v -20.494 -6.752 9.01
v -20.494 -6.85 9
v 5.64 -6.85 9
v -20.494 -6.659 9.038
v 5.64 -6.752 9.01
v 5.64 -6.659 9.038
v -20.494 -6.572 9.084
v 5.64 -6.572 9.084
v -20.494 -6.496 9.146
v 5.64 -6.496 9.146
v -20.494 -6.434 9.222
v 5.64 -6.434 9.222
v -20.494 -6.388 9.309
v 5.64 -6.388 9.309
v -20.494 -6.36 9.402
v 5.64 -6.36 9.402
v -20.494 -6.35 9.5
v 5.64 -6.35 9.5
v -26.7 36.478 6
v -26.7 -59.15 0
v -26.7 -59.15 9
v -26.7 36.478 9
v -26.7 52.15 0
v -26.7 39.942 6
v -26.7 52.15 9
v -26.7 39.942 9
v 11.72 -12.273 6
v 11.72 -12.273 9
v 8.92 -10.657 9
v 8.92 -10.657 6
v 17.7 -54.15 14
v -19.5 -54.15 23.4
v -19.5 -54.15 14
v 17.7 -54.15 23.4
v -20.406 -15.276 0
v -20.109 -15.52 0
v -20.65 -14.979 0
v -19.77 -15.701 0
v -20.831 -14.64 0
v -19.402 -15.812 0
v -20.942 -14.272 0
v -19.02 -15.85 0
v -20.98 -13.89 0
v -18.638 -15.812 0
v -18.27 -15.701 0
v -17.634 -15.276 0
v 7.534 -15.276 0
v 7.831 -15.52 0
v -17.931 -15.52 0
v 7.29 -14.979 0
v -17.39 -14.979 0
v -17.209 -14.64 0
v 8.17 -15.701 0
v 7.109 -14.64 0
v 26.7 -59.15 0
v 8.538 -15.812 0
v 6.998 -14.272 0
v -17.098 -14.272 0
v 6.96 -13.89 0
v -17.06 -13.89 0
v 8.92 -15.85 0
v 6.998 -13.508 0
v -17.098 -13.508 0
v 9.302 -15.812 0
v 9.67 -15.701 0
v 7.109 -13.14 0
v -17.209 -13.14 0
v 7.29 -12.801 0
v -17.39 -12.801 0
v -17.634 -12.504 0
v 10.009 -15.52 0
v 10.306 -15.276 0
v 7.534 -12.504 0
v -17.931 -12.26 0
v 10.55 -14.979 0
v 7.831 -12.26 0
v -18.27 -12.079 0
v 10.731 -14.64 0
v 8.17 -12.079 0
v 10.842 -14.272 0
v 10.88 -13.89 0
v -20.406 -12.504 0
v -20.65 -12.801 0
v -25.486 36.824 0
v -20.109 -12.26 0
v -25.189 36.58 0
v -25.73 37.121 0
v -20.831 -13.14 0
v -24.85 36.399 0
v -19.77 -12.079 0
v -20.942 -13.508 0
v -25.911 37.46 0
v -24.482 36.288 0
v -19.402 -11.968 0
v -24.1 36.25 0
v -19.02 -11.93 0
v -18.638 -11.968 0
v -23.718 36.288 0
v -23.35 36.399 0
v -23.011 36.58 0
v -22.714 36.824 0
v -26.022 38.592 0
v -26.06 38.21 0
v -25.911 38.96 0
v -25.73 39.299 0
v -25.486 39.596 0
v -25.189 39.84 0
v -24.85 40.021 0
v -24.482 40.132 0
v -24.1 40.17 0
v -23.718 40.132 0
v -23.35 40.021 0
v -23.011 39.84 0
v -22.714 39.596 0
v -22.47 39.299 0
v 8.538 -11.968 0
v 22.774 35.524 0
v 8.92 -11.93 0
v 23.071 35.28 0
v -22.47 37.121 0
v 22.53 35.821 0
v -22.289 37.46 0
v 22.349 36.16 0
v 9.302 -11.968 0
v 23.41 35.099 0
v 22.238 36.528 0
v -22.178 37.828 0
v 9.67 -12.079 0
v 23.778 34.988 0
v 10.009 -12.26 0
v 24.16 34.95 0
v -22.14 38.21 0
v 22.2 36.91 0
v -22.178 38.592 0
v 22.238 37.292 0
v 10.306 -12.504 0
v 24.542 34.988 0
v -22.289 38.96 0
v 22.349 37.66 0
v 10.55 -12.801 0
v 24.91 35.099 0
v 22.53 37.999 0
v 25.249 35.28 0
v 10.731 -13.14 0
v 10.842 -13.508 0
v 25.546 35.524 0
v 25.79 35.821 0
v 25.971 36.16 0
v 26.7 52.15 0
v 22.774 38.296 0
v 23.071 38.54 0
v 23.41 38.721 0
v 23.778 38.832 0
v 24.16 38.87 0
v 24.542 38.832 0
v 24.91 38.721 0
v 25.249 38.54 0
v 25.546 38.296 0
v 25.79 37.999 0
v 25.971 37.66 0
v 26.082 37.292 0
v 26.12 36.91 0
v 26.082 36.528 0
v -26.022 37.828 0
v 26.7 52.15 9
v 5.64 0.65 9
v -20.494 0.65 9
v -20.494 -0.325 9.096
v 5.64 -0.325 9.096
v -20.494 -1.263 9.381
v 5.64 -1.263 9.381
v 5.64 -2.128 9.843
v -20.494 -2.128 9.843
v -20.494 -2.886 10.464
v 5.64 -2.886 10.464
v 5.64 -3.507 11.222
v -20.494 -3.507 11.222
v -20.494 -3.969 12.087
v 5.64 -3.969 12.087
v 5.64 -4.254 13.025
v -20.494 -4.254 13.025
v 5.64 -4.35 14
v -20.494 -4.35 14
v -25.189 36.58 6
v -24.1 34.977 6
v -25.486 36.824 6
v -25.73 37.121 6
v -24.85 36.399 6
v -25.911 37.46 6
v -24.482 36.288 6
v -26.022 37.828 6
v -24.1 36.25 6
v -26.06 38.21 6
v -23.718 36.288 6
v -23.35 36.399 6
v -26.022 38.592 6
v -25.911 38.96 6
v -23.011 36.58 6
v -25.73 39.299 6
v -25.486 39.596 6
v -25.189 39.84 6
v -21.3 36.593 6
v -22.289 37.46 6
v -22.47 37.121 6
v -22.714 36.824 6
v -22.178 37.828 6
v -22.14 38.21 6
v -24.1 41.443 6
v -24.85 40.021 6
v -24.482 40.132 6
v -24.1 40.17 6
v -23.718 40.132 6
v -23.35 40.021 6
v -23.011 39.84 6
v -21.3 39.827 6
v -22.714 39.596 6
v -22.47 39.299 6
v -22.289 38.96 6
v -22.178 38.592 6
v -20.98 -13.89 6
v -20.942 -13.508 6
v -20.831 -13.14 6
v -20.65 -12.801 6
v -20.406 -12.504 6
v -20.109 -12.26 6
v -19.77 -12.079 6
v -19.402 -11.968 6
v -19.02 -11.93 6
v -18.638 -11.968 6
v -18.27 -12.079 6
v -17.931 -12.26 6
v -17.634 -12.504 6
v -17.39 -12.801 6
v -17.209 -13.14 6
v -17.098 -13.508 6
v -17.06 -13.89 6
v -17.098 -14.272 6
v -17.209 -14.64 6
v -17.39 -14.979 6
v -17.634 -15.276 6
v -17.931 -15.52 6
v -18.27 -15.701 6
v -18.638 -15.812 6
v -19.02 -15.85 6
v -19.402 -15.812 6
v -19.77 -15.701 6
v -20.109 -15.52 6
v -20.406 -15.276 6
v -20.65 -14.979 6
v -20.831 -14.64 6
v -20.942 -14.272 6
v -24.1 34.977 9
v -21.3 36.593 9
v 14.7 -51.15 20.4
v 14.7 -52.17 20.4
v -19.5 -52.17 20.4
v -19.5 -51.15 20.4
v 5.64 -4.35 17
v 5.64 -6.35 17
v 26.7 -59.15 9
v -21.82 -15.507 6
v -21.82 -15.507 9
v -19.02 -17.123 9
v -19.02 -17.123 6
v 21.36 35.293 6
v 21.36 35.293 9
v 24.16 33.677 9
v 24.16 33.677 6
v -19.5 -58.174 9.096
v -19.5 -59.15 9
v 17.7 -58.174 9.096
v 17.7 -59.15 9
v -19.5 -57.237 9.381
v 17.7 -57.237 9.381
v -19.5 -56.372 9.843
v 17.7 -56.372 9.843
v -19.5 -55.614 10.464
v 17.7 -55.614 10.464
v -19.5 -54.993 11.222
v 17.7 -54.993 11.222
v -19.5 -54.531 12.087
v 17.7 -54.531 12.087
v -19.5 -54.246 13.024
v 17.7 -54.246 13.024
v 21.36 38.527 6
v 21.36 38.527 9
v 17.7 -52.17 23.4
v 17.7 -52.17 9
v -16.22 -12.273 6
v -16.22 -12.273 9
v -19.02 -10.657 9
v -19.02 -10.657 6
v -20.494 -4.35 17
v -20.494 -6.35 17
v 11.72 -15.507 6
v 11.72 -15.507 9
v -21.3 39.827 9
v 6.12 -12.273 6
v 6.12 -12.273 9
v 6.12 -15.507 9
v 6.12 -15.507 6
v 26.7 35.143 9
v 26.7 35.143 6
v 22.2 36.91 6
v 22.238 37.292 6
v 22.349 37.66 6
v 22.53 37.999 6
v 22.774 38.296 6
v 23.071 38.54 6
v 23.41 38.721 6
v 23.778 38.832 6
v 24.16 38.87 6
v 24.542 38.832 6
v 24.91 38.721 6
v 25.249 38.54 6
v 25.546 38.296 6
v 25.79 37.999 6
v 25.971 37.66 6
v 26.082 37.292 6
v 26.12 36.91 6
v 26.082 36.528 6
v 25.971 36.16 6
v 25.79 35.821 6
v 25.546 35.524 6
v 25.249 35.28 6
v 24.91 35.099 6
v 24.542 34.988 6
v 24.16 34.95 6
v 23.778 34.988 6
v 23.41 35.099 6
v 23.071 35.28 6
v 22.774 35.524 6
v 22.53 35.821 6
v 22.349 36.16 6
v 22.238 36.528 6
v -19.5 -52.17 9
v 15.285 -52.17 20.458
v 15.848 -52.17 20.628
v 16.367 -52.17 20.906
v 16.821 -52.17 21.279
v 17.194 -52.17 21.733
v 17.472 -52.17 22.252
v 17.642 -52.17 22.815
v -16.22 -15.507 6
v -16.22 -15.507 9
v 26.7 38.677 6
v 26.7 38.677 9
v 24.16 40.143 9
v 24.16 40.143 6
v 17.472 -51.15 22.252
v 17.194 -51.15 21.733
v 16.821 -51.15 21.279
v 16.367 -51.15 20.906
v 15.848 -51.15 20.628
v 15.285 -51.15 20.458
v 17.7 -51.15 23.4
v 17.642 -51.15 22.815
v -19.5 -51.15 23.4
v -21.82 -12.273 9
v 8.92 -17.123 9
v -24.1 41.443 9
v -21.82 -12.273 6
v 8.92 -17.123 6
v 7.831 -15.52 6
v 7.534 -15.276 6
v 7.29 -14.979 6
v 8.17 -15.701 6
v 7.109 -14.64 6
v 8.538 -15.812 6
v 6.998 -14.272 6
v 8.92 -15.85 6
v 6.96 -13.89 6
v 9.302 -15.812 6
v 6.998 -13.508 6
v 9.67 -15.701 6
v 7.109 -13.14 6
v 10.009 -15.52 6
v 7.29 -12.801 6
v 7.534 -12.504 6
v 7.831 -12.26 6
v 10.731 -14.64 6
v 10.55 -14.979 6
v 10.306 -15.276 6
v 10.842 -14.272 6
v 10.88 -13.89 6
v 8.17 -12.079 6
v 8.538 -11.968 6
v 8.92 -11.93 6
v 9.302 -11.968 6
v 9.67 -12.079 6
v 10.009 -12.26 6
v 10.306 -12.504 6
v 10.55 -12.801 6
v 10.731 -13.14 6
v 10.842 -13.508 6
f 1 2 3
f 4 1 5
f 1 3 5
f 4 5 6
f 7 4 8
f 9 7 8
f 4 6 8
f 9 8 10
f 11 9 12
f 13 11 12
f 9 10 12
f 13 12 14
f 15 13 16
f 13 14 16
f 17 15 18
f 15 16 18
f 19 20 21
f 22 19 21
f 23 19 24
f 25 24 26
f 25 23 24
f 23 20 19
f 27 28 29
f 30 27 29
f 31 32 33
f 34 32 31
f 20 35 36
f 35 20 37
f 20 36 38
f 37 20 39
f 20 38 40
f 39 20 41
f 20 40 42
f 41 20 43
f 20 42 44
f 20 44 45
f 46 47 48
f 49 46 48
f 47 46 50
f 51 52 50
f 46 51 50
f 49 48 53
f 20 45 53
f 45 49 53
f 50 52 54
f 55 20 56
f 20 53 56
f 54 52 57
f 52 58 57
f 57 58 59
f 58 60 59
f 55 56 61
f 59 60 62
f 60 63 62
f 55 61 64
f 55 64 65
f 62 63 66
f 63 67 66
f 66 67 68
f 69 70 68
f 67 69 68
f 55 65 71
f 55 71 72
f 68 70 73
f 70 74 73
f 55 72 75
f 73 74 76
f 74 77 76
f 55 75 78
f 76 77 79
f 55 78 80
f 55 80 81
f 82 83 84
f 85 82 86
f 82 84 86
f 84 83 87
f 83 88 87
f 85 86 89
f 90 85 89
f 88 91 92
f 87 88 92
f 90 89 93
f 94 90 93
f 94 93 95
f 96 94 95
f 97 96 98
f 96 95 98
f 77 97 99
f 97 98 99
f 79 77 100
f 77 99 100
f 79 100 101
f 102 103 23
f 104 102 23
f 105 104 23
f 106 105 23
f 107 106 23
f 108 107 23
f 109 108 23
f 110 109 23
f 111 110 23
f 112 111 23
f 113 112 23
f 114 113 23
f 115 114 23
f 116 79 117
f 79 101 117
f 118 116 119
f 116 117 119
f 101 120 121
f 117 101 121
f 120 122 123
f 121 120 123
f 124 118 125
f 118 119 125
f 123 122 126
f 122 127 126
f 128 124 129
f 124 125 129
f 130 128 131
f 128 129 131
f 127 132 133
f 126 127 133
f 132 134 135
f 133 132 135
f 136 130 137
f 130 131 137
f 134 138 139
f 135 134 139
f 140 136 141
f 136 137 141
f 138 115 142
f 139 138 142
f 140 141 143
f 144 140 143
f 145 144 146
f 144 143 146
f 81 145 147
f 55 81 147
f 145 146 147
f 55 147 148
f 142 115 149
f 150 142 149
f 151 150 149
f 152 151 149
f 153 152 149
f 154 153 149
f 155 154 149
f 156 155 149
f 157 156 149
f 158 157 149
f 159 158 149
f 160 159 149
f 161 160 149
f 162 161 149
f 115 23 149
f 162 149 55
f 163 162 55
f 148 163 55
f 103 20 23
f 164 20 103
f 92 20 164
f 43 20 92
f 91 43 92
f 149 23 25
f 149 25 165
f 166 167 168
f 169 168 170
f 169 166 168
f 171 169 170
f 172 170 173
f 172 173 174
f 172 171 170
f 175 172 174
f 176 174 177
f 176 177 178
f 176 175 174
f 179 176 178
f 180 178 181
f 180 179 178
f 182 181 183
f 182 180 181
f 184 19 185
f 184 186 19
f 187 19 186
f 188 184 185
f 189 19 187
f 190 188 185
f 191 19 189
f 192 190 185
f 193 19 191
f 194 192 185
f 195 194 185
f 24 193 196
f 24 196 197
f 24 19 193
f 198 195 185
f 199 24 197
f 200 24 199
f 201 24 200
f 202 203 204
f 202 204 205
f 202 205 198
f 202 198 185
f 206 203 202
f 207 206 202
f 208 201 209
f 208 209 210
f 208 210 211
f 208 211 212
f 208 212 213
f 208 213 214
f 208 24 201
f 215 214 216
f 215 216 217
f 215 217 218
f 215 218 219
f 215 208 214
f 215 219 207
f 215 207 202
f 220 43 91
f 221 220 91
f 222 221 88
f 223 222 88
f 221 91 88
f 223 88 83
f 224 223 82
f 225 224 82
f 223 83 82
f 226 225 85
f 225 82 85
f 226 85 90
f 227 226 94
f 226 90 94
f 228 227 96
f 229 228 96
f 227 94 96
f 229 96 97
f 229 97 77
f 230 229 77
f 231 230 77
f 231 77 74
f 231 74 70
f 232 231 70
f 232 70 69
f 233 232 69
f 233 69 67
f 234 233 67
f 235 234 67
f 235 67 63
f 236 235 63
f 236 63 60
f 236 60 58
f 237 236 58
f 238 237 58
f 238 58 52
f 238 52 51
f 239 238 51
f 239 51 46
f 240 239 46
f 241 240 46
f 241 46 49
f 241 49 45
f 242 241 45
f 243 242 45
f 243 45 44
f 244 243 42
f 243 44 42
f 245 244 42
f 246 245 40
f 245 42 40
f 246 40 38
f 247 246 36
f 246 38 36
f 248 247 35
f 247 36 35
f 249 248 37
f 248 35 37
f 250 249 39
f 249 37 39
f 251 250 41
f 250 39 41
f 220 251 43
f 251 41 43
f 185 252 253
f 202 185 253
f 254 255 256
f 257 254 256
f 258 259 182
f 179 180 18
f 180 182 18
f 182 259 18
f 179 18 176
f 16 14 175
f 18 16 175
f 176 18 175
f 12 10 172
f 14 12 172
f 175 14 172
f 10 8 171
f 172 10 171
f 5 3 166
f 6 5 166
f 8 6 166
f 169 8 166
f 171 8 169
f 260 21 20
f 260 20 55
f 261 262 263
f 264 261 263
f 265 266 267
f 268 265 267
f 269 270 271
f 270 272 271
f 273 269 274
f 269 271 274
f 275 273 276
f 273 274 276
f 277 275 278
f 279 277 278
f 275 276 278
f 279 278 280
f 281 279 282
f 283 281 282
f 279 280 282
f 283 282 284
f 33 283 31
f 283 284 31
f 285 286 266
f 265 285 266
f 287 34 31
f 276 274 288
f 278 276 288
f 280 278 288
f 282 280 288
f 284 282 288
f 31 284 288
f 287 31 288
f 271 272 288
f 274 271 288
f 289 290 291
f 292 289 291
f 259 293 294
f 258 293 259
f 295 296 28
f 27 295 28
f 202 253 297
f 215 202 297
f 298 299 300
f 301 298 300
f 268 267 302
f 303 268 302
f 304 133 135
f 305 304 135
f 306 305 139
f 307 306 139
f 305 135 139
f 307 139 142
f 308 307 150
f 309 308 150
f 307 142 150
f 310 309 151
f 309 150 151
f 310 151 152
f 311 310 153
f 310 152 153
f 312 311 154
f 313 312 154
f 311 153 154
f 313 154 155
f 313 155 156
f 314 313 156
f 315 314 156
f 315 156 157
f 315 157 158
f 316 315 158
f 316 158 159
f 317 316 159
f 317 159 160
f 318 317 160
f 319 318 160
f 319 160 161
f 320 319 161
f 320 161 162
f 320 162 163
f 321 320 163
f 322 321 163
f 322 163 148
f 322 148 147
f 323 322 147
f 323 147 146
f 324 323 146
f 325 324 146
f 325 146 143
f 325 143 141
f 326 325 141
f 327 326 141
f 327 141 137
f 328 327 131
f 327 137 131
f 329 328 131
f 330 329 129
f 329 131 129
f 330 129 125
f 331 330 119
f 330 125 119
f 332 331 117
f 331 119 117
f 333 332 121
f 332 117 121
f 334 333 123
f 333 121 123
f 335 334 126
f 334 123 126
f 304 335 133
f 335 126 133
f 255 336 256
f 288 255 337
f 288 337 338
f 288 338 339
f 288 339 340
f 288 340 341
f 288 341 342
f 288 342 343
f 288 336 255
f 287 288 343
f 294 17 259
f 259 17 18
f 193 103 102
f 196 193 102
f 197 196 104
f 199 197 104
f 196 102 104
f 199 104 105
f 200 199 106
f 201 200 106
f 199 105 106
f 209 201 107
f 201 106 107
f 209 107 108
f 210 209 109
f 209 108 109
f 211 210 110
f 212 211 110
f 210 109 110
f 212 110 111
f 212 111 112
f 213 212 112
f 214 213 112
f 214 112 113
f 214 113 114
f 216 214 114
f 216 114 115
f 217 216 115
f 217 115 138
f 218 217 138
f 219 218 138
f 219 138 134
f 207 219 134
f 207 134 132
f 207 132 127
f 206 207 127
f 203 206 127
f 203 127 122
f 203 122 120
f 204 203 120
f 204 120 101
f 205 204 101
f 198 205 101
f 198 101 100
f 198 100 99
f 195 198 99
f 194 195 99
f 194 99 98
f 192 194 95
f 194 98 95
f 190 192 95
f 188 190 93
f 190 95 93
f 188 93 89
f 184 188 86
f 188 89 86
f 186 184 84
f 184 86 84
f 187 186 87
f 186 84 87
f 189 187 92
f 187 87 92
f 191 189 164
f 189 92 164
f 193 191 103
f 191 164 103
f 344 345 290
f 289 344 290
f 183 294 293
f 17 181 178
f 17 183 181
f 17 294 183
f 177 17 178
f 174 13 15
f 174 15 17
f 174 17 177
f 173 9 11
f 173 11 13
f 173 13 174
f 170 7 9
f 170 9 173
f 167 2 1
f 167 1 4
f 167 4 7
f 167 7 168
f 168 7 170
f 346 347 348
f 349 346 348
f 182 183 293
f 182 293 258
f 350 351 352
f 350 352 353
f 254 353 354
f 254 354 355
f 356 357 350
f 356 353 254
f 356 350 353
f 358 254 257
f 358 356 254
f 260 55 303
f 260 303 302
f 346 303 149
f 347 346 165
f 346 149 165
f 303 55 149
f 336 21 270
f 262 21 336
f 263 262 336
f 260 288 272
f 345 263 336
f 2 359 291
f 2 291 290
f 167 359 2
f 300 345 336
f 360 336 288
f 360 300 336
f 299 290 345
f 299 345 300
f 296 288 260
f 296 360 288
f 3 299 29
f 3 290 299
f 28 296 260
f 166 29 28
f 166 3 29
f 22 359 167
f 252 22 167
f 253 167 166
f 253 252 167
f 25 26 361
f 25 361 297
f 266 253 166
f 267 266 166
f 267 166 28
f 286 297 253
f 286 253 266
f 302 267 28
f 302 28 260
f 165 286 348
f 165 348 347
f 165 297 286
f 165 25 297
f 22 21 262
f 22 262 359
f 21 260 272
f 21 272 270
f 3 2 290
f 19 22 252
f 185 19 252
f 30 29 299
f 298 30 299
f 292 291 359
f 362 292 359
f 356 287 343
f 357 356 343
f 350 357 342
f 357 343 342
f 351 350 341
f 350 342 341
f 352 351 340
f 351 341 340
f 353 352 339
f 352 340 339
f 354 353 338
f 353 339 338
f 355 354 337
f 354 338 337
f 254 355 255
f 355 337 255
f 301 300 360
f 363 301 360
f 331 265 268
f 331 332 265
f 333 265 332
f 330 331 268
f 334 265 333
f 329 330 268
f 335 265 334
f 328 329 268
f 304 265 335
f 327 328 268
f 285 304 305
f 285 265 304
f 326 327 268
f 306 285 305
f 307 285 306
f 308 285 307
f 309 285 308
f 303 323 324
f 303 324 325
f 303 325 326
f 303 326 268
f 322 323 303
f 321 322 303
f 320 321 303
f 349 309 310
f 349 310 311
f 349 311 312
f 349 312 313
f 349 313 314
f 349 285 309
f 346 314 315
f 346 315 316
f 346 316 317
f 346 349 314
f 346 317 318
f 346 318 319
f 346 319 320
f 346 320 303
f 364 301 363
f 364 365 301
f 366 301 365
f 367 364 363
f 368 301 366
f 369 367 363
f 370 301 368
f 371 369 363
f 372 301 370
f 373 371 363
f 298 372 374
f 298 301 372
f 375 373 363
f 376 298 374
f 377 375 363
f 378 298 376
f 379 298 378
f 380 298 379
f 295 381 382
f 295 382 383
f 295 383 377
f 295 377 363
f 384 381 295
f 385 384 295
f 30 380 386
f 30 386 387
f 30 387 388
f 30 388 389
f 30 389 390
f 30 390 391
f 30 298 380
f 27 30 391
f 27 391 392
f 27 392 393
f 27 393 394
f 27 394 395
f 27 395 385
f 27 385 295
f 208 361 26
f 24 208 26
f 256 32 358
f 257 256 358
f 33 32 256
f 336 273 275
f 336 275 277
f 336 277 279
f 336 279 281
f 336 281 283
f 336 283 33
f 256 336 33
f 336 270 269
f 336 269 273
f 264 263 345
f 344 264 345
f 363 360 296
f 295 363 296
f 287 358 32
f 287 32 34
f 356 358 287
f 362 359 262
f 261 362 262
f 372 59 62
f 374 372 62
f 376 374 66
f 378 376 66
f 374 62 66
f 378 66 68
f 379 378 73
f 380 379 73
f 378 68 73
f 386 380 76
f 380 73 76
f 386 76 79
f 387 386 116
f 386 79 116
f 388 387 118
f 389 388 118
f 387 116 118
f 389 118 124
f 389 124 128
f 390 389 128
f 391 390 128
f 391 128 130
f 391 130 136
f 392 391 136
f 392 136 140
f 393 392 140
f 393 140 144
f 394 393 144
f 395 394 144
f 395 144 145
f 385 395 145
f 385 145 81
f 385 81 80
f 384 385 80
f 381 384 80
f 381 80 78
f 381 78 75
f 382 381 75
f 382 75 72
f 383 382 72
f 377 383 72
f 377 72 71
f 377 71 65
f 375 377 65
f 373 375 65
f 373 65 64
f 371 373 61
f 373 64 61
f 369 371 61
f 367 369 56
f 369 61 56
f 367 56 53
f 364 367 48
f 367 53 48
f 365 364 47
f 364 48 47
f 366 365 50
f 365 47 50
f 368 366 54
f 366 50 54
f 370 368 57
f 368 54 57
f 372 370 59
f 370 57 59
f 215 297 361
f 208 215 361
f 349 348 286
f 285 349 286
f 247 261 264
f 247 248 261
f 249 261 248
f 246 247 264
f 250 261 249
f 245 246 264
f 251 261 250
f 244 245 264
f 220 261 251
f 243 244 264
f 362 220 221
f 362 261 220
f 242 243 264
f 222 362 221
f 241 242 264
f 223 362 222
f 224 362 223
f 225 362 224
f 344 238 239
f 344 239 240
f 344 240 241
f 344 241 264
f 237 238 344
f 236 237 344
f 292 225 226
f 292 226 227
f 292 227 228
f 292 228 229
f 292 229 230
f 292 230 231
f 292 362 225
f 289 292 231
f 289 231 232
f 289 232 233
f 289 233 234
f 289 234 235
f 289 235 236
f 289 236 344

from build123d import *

# Parameters (mm, degrees)
SKETCH2_W           = 53.4
SKETCH2_H           = 104.3
BOSS_EXTRUDE1_DEPTH = 9
SKETCH3_R           = 1.96
CUT_EXTRUDE1_DEPTH  = 60.274889287
SKETCH4_W           = 26.134
SKETCH4_H           = 2
BOSS_EXTRUDE2_DEPTH = 8
FILLET1_R           = 0.5
CUT_EXTRUDE3_DEPTH  = 3
SKETCH8_W           = 53.4
SKETCH8_H           = 9
BOSS_EXTRUDE4_DEPTH = 2
SKETCH9_W           = 37.2
SKETCH9_H           = 1.98
BOSS_EXTRUDE5_DEPTH = 14.4
BOSS_EXTRUDE6_DEPTH = 3
FILLET2_R           = 5
SKETCH13_W          = 53.4
SKETCH13_H          = 9
BOSS_EXTRUDE8_DEPTH = 5
FILLET3_R           = 5


with BuildPart() as part:
    # Sketch2 → Boss-Extrude1 (new body)
    with BuildSketch(Plane.XY):
        Rectangle(SKETCH2_W, SKETCH2_H)
    extrude(amount=BOSS_EXTRUDE1_DEPTH)

    # Sketch3 → Cut-Extrude1 (cut, through all)
    with BuildSketch(Plane(origin=(0, 0, 0), x_dir=(-1, 0, 0), z_dir=(0, 0, -1))):
        with Locations((24.1, 38.21)):
            Circle(SKETCH3_R)
        with Locations((-24.16, 36.91)):
            Circle(SKETCH3_R)
        with Locations((-8.92, -13.89)):
            Circle(SKETCH3_R)
        with Locations((19.02, -13.89)):
            Circle(SKETCH3_R)
    extrude(amount=-CUT_EXTRUDE1_DEPTH, mode=Mode.SUBTRACT)

    # Sketch4 → Boss-Extrude2 (add)
    with BuildSketch(Plane.XY.offset(9)):
        with Locations((-7.427, -5.35)):
            Rectangle(SKETCH4_W, SKETCH4_H)
    extrude(amount=BOSS_EXTRUDE2_DEPTH)

    # Fillet1
    fillet1_edges = [part.edges().sort_by_distance(p)[0] for p in [
        (-7.427, -6.35, 9),
    ]]
    fillet(fillet1_edges, radius=FILLET1_R)

    # Sketch6 → Cut-Extrude3 (cut)
    with BuildSketch(Plane.XY.offset(9)):
        Polygon((-21.3, 36.593419246), (-21.3, 39.826580754), (-24.1, 41.443161507), (-26.9, 39.826580754), (-26.9, 36.593419246), (-24.1, 34.976838493), align=None)
        Polygon((26.96, 35.293419246), (26.96, 38.526580754), (24.16, 40.143161507), (21.36, 38.526580754), (21.36, 35.293419246), (24.16, 33.676838493), align=None)
        Polygon((-16.22, -15.506580754), (-16.22, -12.273419246), (-19.02, -10.656838493), (-21.82, -12.273419246), (-21.82, -15.506580754), (-19.02, -17.123161507), align=None)
        Polygon((11.72, -15.506580754), (11.72, -12.273419246), (8.92, -10.656838493), (6.12, -12.273419246), (6.12, -15.506580754), (8.92, -17.123161507), align=None)
    extrude(amount=-CUT_EXTRUDE3_DEPTH, mode=Mode.SUBTRACT)

    # Sketch8 → Boss-Extrude4 (add)
    with BuildSketch(Plane.XZ.offset(52.15)):
        with Locations((0, 4.5)):
            Rectangle(SKETCH8_W, SKETCH8_H)
    extrude(amount=BOSS_EXTRUDE4_DEPTH)

    # Sketch9 → Boss-Extrude5 (add)
    with BuildSketch(Plane.XY.offset(9)):
        with Locations((-0.9, -53.16)):
            Rectangle(SKETCH9_W, SKETCH9_H)
    extrude(amount=BOSS_EXTRUDE5_DEPTH)

    # Sketch10 → Boss-Extrude6 (add)
    with BuildSketch(Plane.XZ.offset(54.15)):
        with BuildLine():
            Line((14.7, 20.4), (-19.5, 20.4))
            Line((-19.5, 20.4), (-19.5, 23.4))
            Line((-19.5, 23.4), (17.7, 23.4))
            ThreePointArc((17.7, 23.4), (16.821320344, 21.278679656), (14.7, 20.4))
        make_face()
    extrude(amount=-BOSS_EXTRUDE6_DEPTH)

    # Fillet2
    fillet2_edges = [part.edges().sort_by_distance(p)[0] for p in [
        (-7.427, -4.35, 9),
    ]]
    fillet(fillet2_edges, radius=FILLET2_R)

    # Sketch13 → Boss-Extrude8 (add)
    with BuildSketch(Plane.XZ.offset(54.15)):
        with Locations((0, 4.5)):
            Rectangle(SKETCH13_W, SKETCH13_H)
    extrude(amount=BOSS_EXTRUDE8_DEPTH)

    # Fillet3
    fillet3_edges = [part.edges().sort_by_distance(p)[0] for p in [
        (-0.9, -54.15, 9),
    ]]
    fillet(fillet3_edges, radius=FILLET3_R - 0.0001)  # a hair under: the kernel refuses the full size


solid = part.part
